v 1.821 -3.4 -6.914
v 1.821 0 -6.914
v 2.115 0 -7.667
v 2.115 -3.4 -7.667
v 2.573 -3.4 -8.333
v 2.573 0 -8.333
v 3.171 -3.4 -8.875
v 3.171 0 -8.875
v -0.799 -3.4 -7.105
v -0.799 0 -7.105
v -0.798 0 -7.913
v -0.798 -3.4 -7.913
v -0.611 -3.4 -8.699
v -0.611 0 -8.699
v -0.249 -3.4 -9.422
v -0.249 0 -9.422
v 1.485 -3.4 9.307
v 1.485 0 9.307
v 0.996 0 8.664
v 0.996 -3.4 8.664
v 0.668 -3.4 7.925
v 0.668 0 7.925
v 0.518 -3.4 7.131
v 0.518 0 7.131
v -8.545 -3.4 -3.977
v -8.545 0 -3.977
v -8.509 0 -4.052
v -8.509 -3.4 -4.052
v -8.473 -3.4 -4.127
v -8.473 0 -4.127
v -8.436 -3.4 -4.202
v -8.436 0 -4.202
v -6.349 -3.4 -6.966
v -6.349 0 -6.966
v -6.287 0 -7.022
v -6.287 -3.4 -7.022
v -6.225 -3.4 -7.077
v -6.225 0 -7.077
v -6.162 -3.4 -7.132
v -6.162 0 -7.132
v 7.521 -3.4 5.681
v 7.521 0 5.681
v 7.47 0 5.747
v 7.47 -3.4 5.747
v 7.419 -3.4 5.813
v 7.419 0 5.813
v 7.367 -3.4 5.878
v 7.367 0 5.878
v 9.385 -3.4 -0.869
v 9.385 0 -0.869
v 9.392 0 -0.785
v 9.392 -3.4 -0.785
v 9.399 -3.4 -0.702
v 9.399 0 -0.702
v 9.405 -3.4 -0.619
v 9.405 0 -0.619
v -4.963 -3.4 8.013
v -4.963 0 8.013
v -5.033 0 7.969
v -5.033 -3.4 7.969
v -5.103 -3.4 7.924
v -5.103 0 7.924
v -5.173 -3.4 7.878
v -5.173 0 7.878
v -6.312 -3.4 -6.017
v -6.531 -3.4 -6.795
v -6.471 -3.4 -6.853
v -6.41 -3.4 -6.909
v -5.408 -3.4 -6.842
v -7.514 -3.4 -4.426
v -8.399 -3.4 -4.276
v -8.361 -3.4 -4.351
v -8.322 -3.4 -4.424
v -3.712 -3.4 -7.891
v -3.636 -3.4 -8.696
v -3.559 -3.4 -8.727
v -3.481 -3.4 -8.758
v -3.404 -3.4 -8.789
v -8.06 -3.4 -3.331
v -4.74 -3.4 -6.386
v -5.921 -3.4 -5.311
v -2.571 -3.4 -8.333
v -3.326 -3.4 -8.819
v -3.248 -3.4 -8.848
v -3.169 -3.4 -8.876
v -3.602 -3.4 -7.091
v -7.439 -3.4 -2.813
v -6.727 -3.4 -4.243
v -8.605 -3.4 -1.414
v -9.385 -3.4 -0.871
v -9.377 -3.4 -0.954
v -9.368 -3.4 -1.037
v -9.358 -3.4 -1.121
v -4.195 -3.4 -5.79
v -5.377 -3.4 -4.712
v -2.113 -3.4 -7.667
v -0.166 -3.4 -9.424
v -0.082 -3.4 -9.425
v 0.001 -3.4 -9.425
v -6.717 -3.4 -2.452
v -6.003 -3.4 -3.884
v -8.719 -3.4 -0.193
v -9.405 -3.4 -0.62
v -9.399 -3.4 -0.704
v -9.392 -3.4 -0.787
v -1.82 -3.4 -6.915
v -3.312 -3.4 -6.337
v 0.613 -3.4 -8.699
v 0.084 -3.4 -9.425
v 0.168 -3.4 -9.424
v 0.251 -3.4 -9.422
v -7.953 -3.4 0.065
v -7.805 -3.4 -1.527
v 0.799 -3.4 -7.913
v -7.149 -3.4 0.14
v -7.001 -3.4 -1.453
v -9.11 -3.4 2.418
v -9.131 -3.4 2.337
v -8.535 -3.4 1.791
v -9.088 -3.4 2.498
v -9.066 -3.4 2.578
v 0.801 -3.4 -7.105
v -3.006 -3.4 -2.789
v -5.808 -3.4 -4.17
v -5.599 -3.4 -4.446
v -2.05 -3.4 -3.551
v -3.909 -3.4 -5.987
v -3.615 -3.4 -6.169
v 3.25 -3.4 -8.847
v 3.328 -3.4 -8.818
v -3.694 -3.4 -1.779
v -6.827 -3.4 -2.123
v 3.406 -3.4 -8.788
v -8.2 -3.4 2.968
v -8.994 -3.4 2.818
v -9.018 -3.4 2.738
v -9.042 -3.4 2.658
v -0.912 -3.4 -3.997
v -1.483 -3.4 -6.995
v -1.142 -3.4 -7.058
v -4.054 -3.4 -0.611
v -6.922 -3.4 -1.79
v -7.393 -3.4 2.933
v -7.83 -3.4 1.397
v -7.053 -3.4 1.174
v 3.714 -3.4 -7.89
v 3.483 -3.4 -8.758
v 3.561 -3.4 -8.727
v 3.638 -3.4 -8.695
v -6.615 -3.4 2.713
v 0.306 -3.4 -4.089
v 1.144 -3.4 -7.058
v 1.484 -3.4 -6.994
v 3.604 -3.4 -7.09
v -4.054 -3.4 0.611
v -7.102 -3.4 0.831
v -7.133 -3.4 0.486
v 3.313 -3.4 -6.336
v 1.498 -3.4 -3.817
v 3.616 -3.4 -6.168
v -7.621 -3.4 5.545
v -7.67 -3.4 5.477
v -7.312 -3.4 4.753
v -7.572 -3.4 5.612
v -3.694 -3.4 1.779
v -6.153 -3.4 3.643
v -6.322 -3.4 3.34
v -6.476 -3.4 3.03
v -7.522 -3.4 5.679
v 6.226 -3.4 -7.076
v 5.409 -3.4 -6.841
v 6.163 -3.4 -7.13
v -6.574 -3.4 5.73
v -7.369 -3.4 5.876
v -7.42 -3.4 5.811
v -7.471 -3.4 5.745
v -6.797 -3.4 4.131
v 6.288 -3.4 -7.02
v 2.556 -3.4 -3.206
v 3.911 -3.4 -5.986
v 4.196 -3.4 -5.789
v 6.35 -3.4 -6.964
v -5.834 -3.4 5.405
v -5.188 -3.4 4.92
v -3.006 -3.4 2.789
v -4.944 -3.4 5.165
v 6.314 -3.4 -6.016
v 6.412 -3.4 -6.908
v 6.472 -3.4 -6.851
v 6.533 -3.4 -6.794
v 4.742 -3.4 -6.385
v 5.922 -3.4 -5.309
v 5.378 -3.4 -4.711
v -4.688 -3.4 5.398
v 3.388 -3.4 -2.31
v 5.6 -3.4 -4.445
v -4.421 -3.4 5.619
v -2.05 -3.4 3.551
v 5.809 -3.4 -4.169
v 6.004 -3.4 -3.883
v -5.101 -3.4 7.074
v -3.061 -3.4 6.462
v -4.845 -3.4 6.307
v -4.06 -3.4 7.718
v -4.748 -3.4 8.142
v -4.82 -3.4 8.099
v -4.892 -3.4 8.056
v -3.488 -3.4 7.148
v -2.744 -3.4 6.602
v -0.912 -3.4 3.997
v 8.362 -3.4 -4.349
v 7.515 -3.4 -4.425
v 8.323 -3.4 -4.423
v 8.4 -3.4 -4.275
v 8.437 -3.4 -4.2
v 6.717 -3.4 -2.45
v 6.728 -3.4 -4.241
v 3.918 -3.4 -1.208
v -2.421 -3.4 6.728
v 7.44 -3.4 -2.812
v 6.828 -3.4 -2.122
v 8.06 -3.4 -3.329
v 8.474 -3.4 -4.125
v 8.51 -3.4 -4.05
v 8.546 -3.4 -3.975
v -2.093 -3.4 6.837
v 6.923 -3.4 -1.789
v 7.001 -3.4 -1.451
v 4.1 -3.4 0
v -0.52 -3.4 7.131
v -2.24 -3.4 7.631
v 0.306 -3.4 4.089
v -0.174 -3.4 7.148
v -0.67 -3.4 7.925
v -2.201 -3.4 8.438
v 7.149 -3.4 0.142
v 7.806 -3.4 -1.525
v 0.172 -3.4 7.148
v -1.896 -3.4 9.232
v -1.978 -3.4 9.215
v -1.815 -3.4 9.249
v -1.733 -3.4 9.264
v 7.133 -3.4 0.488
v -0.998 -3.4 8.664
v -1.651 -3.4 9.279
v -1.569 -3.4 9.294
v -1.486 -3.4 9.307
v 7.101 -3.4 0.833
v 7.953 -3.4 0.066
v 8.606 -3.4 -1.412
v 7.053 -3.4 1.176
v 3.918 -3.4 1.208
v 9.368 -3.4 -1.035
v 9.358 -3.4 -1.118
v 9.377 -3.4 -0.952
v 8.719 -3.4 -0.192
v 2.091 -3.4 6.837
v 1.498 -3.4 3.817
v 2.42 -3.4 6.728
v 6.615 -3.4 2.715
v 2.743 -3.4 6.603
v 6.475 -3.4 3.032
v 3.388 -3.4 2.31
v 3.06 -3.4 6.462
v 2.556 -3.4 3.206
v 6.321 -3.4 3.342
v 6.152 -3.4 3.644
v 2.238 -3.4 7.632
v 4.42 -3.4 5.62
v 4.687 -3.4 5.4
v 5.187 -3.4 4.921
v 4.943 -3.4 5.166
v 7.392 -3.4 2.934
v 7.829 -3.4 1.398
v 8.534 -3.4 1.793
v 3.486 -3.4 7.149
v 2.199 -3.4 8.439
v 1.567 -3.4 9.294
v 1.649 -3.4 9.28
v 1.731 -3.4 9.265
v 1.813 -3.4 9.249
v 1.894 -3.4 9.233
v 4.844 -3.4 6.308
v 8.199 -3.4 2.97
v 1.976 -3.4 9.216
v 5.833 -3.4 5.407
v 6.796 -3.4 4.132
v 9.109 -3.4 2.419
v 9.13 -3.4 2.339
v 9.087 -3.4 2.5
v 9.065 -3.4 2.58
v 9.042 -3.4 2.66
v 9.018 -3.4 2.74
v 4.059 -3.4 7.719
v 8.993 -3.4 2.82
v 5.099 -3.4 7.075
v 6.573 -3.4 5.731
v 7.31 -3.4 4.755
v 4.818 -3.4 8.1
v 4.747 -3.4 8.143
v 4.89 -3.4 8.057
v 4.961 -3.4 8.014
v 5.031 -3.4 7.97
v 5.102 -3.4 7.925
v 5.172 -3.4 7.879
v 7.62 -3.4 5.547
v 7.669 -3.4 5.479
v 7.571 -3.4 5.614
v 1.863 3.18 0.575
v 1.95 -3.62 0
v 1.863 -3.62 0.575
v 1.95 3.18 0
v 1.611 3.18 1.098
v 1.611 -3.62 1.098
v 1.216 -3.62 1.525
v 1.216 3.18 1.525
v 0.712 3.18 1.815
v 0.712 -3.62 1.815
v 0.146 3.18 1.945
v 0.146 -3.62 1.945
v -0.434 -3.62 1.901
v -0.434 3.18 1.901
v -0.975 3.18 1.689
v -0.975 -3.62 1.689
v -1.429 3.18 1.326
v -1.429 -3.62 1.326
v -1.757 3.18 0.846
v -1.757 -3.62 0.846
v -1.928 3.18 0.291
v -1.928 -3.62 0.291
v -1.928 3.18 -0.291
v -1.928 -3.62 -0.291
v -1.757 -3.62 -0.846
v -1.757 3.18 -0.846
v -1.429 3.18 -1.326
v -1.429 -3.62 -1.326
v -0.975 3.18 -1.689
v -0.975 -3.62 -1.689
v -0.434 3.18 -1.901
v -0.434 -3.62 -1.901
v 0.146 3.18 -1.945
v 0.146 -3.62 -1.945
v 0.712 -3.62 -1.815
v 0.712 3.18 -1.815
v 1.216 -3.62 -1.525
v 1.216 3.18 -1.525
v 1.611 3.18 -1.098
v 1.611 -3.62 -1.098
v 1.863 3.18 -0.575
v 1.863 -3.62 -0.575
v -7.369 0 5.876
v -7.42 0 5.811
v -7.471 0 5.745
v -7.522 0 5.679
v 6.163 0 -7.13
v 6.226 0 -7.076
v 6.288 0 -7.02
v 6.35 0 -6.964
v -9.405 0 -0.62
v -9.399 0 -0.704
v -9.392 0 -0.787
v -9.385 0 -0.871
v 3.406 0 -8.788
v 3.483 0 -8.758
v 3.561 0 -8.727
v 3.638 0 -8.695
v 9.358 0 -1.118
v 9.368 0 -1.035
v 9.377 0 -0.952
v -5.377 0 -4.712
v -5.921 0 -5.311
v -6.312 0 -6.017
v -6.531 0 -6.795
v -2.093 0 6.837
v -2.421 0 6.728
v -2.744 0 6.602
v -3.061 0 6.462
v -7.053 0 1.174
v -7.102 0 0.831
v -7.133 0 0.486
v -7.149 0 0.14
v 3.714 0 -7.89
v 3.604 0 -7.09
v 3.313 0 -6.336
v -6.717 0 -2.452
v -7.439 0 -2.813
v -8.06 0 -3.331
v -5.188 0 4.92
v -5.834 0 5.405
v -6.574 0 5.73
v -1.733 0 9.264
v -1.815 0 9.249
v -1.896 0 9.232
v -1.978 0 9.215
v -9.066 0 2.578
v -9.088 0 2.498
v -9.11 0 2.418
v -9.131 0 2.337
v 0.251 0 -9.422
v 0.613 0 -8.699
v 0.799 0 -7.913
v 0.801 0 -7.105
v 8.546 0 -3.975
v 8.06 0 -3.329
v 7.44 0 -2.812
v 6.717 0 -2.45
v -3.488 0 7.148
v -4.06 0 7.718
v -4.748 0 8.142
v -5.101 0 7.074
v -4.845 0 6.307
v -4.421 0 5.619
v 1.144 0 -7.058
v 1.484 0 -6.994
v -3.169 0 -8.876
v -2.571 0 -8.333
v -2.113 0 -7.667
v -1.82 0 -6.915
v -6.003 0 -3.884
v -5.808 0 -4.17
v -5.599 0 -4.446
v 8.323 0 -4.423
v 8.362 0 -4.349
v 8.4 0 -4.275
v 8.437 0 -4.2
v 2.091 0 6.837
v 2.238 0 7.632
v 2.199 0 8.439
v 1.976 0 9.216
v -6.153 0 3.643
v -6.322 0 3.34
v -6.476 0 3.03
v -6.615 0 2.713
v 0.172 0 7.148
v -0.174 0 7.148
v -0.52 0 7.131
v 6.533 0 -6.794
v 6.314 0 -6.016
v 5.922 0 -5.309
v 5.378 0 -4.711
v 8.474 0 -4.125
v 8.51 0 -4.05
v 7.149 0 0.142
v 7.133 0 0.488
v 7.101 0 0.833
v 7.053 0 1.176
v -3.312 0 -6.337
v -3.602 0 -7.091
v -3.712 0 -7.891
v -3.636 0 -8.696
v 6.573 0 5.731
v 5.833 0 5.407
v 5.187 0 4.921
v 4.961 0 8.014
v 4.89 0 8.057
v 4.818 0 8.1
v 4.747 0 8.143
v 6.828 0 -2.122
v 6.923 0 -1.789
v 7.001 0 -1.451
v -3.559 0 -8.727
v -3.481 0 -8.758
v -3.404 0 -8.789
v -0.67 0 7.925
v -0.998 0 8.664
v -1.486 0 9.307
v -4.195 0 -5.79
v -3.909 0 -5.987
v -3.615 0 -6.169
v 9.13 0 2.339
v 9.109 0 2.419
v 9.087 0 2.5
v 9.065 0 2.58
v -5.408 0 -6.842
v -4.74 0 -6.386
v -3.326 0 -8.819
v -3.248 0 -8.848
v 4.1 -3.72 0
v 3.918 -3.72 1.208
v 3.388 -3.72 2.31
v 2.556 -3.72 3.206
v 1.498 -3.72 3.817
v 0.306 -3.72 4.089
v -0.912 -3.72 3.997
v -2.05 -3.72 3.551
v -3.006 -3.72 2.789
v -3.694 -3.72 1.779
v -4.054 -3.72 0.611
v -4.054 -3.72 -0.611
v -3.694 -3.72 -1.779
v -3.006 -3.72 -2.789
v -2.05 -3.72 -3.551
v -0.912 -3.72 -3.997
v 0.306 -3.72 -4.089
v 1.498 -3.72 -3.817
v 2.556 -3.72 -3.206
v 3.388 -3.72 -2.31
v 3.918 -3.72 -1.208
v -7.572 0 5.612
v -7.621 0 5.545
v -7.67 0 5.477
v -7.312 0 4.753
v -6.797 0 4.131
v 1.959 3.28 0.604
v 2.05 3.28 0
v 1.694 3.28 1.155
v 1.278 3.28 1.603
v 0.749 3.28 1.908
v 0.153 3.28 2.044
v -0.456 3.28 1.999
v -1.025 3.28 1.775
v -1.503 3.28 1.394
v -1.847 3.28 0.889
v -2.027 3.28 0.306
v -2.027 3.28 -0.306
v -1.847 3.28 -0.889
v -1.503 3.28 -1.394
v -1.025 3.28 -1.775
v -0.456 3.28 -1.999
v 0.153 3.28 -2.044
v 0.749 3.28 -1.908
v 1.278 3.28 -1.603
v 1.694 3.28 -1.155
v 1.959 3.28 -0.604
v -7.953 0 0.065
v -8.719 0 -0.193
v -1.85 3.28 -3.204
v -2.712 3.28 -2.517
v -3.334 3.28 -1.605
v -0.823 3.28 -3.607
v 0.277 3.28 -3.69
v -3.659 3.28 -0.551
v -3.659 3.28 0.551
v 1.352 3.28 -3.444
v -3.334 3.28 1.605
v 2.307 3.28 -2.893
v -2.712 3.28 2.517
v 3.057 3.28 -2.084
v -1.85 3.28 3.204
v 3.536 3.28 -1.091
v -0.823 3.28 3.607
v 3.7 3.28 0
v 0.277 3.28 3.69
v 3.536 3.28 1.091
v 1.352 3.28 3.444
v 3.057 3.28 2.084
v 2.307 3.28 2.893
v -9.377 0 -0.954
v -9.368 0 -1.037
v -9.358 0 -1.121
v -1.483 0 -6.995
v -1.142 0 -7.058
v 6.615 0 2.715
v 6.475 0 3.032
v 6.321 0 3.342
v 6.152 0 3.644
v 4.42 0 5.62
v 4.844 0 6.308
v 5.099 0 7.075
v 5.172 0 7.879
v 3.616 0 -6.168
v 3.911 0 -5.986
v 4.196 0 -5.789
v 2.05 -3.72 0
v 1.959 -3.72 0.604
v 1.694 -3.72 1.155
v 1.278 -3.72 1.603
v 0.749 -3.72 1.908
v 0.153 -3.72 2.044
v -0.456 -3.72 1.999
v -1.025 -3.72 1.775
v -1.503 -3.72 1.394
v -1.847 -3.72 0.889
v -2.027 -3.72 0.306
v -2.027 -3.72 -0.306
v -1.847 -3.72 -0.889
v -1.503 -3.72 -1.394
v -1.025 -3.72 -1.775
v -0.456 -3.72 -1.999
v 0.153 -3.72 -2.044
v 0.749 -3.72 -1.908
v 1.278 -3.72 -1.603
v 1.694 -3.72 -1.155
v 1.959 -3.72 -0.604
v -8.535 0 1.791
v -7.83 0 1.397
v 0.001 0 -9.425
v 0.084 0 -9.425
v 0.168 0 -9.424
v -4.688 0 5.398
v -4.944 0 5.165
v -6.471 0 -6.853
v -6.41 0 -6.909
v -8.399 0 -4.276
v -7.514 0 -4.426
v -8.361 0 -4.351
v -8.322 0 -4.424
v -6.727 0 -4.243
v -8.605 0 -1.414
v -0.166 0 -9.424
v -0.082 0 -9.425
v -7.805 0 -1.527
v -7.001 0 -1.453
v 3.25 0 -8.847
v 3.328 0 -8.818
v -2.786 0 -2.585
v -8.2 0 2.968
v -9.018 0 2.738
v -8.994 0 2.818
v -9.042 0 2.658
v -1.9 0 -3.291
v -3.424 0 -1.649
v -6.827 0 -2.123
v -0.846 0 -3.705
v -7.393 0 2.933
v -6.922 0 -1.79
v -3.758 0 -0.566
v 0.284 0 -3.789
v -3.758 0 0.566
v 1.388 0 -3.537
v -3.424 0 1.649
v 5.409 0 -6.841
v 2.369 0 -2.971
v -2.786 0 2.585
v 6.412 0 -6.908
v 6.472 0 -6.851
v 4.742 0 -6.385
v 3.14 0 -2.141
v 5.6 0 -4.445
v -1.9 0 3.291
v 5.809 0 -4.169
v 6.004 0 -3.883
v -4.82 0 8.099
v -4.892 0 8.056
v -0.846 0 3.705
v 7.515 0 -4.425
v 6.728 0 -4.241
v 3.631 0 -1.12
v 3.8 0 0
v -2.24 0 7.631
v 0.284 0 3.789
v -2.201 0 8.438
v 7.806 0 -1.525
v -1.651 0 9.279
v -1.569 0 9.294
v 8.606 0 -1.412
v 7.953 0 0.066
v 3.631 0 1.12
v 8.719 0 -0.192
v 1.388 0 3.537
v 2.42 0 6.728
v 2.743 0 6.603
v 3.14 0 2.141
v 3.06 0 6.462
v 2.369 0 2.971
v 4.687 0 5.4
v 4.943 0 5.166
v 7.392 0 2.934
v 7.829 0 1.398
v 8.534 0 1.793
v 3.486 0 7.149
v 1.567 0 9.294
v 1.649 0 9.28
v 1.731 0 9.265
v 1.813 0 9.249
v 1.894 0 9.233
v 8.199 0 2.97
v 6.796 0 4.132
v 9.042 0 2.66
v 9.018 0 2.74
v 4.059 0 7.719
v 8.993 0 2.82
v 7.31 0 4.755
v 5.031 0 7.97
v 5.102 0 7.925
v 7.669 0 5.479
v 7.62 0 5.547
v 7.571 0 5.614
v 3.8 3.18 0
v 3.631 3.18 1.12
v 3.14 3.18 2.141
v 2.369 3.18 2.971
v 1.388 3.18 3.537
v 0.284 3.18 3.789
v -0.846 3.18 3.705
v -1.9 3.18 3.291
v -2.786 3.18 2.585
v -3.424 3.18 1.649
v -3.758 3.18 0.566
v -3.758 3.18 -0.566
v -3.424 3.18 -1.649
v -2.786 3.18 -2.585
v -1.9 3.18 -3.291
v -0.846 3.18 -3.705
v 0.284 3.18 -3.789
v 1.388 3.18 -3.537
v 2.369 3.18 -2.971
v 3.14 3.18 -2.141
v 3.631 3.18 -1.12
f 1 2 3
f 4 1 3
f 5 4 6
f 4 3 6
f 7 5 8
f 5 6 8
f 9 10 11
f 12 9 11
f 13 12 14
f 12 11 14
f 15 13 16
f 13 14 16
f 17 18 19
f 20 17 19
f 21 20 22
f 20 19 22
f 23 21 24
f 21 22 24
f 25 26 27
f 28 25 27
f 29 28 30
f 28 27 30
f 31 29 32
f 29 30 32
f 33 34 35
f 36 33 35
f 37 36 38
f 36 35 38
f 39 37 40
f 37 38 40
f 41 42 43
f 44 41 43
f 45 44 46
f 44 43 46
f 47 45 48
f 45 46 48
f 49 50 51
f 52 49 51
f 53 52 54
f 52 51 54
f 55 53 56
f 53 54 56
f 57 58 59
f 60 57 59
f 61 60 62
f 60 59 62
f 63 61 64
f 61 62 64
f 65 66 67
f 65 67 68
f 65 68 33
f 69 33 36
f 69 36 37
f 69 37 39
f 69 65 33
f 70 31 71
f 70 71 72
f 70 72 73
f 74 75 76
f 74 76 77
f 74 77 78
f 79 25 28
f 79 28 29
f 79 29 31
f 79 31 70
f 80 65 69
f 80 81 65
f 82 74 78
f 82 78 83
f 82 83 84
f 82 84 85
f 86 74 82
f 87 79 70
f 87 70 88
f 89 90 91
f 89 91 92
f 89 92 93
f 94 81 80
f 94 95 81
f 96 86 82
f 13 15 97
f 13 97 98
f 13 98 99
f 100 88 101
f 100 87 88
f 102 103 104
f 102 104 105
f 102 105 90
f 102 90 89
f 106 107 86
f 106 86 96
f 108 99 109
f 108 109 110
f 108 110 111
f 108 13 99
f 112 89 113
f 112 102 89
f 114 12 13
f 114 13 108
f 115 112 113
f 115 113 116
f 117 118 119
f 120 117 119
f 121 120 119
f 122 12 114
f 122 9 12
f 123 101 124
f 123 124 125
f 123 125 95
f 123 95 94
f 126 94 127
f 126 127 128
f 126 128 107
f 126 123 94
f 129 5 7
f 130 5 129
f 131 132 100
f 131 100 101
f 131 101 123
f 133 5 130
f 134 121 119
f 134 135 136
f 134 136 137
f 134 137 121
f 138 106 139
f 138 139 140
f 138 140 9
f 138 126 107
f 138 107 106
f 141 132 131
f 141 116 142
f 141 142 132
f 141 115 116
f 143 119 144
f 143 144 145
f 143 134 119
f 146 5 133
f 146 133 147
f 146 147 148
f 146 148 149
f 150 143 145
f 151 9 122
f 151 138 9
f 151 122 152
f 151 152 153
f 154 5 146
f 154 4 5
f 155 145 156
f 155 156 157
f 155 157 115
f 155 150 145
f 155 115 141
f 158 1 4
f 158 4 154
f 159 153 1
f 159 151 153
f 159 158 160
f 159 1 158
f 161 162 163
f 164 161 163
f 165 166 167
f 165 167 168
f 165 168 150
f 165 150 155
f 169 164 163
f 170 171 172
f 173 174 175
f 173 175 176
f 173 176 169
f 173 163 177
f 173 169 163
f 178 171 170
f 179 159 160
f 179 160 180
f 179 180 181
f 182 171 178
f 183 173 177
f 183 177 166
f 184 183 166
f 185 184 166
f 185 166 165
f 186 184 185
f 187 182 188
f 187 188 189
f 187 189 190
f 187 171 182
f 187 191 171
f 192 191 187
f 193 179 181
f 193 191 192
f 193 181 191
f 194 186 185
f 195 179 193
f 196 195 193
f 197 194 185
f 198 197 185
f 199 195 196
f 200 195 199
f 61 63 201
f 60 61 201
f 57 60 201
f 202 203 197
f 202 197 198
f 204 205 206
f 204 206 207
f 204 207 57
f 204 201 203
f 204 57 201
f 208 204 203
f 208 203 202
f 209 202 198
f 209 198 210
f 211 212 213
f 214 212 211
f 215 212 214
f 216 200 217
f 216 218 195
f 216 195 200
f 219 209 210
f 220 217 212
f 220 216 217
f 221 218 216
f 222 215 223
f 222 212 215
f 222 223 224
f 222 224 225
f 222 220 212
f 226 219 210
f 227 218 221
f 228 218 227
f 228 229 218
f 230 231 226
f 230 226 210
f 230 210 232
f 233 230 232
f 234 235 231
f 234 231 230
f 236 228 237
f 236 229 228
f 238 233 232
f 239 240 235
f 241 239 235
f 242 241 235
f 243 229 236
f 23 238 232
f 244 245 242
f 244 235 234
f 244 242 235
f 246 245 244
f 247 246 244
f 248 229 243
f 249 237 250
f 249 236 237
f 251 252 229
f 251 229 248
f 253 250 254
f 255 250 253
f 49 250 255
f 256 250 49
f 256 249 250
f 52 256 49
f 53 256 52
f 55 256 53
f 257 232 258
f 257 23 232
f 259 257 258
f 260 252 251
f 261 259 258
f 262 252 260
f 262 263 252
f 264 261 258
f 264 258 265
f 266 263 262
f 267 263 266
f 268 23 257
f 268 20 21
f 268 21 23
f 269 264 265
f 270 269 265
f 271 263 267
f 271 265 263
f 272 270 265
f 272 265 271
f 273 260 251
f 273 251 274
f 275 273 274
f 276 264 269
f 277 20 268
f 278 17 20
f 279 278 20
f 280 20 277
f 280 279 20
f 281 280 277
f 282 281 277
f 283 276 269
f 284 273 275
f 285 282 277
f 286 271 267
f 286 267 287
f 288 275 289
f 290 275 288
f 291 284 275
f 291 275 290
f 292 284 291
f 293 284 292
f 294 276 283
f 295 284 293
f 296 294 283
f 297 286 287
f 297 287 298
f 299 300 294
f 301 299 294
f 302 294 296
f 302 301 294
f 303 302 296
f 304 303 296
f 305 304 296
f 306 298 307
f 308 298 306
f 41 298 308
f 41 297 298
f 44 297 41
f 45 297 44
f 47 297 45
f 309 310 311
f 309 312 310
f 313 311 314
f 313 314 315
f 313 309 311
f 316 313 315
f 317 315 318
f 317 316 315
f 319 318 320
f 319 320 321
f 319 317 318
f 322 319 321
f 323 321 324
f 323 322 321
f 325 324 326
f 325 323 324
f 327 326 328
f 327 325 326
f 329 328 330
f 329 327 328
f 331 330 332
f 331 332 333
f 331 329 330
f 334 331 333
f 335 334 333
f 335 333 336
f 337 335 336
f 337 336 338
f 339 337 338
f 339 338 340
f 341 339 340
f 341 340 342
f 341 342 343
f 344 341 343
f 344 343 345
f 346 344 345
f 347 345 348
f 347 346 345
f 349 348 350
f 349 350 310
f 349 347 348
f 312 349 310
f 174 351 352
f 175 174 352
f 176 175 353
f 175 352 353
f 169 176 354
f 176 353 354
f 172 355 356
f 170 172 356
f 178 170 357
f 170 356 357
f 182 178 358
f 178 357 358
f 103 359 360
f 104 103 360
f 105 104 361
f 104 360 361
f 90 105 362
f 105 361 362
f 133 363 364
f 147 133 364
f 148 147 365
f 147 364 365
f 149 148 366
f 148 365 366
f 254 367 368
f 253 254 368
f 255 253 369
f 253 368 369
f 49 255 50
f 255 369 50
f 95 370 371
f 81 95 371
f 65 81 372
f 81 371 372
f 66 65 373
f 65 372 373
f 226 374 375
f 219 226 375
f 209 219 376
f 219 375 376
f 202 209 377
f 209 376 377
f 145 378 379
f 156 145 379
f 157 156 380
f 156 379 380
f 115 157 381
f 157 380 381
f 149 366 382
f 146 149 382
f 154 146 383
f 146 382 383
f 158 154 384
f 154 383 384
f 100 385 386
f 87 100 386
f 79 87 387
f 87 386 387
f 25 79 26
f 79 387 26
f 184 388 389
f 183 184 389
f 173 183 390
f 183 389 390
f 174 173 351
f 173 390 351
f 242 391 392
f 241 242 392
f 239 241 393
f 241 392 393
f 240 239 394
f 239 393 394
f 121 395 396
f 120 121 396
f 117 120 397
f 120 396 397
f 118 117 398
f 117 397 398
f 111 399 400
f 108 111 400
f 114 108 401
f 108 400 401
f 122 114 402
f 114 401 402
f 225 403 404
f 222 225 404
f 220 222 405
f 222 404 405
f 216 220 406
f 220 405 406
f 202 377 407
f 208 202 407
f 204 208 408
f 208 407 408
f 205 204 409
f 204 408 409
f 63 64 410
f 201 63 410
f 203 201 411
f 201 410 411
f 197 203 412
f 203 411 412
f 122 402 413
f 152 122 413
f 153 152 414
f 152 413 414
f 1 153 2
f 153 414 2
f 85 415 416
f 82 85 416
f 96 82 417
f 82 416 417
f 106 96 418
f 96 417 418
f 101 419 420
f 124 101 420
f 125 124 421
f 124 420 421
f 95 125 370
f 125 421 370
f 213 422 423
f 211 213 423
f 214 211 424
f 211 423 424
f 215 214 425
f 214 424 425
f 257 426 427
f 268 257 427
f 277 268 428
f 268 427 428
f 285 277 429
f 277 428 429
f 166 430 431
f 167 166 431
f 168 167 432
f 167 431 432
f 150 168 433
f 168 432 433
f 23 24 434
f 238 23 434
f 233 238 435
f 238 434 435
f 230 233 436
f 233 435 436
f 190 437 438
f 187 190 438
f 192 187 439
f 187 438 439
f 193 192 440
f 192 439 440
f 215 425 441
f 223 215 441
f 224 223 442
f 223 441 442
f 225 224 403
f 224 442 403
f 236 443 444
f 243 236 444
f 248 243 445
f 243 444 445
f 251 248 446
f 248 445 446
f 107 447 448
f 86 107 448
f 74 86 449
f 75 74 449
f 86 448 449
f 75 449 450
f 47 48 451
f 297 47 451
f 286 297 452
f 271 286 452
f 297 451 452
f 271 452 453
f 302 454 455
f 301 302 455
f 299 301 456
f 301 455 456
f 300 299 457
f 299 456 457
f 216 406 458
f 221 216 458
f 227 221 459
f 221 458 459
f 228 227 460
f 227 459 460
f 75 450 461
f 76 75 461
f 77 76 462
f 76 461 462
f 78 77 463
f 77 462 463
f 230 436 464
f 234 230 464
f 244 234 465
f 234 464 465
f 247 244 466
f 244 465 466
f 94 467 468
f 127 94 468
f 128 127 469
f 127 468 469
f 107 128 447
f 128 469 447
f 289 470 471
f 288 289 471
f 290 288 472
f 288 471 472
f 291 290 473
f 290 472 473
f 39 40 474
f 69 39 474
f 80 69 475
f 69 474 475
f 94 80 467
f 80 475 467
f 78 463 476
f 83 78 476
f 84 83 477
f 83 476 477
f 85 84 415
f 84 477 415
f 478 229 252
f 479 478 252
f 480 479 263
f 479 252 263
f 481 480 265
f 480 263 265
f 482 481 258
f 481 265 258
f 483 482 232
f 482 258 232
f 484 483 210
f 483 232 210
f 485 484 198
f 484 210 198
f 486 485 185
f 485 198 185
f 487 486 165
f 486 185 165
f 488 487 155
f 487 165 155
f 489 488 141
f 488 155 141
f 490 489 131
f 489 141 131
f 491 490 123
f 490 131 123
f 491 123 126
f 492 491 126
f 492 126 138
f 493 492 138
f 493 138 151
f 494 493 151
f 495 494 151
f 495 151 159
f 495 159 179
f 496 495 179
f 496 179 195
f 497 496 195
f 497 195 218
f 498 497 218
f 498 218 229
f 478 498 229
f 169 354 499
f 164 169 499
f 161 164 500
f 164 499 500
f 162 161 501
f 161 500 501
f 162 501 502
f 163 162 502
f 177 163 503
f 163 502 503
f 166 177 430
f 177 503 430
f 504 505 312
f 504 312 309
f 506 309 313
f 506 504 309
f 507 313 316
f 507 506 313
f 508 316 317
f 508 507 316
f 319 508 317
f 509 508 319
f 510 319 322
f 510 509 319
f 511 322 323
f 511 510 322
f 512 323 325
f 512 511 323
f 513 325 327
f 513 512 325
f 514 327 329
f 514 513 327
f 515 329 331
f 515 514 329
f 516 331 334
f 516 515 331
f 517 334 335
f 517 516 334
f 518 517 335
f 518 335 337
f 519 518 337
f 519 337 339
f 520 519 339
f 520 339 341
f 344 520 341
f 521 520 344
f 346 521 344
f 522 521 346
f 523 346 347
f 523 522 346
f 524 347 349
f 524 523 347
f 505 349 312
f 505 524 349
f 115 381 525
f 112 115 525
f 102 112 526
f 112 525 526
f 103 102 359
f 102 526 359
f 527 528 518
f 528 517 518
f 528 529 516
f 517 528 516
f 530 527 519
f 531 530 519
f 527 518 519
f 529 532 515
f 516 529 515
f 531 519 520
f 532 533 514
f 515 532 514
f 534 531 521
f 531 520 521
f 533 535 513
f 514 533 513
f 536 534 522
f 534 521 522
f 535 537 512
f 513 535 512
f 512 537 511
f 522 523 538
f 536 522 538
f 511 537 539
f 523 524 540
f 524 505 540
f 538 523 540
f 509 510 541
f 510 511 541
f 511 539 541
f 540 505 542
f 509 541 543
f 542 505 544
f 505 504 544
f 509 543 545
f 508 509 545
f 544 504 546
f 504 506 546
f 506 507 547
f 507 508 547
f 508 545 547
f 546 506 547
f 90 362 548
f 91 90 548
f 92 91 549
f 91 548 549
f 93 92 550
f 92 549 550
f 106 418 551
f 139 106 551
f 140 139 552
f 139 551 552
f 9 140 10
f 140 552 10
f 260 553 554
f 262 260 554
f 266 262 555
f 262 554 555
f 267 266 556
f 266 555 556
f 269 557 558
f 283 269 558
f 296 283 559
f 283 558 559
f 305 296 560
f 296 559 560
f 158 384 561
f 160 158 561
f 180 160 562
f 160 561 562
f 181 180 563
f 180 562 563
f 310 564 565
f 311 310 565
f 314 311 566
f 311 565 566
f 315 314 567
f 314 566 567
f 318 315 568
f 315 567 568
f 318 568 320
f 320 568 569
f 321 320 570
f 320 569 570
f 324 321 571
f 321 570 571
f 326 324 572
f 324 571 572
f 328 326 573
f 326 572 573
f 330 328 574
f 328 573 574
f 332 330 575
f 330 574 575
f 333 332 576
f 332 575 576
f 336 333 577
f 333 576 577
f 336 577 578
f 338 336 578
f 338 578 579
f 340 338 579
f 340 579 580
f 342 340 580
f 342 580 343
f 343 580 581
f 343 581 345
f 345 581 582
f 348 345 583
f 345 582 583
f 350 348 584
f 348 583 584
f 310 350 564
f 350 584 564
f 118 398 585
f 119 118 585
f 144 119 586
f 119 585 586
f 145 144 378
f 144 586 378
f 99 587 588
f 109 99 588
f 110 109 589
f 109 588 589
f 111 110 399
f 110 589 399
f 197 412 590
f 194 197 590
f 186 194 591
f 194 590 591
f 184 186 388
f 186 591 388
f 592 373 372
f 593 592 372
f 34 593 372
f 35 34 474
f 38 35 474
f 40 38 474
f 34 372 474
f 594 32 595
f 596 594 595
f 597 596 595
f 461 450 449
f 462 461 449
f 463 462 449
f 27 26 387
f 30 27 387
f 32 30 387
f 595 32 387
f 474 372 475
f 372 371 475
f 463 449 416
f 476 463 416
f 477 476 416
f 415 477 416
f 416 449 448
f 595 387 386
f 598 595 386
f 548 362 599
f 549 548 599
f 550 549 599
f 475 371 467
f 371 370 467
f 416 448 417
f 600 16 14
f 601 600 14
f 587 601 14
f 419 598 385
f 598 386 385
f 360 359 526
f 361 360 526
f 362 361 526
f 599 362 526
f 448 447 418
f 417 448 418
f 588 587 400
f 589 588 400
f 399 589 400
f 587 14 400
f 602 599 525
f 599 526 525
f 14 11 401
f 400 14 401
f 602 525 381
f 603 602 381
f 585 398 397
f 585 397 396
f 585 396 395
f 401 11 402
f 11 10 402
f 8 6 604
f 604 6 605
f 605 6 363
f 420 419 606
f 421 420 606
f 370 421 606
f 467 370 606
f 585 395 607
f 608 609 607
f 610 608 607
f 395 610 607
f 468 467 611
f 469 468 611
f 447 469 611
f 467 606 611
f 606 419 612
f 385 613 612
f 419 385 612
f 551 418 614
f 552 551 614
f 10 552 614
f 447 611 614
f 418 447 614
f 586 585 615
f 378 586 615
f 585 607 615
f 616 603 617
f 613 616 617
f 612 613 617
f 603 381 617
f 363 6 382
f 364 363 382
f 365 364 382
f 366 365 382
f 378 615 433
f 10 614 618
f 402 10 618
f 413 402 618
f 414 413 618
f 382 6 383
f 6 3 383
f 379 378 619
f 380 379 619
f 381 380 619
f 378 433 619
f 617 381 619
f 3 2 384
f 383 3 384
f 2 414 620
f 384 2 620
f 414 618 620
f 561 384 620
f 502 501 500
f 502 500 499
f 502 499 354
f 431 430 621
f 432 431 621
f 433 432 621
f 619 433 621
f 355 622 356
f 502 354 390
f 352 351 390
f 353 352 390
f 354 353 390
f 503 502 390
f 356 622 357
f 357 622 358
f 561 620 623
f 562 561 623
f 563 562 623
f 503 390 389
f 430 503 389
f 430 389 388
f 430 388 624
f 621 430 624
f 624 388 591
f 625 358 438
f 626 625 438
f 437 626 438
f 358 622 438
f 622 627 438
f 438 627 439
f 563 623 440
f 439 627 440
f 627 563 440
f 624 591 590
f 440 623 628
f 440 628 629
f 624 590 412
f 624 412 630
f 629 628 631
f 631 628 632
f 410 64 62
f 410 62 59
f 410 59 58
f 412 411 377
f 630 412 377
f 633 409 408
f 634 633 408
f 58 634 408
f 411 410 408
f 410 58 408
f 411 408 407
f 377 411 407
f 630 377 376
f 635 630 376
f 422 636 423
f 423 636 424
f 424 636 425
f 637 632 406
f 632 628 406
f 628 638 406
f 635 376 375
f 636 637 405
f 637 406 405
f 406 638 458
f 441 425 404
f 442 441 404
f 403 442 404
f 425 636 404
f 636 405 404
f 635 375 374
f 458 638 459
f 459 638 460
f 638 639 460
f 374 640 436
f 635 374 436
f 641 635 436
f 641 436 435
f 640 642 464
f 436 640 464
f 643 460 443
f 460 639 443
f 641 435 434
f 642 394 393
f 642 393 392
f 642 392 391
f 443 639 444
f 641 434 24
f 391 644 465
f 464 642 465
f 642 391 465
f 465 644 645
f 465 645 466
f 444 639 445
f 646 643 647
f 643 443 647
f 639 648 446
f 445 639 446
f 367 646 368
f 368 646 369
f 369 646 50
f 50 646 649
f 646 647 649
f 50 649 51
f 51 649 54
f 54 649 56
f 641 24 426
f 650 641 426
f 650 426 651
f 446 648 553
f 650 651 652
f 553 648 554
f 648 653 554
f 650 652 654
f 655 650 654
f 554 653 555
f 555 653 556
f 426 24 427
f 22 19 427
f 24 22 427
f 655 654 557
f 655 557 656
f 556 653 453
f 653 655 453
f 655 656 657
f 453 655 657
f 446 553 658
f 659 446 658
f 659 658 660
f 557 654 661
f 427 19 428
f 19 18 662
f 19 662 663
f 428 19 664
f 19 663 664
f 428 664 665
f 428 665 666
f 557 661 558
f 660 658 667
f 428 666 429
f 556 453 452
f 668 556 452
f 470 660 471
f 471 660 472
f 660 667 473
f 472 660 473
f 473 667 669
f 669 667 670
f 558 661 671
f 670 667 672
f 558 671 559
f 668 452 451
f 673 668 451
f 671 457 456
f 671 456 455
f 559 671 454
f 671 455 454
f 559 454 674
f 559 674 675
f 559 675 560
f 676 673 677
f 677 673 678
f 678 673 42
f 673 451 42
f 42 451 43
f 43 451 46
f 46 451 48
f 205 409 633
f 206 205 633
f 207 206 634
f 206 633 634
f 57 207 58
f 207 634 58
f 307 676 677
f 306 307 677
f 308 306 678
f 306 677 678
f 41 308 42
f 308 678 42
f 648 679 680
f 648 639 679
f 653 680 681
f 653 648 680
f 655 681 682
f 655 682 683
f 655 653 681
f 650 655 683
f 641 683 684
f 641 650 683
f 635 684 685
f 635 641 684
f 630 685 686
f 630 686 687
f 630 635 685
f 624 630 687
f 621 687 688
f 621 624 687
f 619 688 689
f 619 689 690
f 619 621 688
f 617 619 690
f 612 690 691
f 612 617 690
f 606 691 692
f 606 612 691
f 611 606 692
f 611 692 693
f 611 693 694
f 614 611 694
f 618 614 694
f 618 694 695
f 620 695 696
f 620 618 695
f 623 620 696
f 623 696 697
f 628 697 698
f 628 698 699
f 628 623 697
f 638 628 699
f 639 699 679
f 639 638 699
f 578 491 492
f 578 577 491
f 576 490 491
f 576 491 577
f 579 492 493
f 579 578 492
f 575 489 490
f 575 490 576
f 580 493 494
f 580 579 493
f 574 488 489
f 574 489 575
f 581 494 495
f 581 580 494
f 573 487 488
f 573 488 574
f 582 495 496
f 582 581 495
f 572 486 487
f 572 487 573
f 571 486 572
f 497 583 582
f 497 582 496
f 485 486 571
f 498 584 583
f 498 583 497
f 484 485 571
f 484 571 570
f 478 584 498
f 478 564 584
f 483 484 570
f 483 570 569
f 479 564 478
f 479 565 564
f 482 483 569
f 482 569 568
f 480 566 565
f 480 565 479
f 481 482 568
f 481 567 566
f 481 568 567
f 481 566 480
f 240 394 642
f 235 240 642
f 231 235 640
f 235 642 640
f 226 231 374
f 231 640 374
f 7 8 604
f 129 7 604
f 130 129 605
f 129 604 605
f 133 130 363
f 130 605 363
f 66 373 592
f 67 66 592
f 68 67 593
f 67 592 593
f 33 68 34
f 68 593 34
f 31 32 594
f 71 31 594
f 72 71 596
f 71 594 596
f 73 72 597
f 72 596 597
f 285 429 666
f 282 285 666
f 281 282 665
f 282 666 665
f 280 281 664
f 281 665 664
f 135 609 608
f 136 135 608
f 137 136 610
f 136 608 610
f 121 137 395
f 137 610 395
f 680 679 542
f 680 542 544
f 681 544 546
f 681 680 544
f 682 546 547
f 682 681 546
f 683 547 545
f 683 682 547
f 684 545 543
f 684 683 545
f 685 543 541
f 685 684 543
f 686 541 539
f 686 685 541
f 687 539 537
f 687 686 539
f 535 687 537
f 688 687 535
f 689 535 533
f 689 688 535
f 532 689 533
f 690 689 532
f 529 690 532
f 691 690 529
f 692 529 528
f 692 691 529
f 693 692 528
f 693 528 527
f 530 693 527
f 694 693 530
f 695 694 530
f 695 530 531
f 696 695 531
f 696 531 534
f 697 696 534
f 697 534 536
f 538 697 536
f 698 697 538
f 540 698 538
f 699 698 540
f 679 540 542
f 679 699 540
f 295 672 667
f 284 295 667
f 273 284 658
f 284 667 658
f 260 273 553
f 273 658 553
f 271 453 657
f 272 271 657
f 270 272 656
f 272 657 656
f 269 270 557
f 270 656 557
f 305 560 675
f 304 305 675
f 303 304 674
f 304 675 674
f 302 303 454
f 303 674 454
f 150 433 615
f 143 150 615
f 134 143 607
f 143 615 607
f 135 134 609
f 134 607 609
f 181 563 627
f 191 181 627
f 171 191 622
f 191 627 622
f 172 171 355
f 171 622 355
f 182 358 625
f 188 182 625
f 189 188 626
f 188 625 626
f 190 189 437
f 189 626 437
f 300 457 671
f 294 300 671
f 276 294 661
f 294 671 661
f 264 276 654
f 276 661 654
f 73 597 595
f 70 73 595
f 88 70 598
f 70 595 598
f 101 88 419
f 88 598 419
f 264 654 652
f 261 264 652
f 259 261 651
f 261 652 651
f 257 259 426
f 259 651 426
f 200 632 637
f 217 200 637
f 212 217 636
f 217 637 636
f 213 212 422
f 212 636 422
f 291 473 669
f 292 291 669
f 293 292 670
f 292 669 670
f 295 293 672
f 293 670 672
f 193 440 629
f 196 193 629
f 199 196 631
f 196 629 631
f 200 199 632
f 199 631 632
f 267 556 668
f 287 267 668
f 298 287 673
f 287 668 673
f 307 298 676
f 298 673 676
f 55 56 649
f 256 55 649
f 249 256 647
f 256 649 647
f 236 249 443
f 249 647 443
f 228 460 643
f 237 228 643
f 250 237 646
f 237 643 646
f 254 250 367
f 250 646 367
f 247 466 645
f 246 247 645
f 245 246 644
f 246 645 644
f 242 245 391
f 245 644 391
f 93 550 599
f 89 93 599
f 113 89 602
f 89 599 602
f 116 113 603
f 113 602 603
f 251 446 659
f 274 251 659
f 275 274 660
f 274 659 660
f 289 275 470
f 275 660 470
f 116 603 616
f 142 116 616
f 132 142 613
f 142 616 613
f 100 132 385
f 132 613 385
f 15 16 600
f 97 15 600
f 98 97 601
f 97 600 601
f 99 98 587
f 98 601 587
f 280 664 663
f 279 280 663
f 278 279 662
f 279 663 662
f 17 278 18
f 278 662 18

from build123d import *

# Parameters (mm, degrees)
F0_R     = 4.1
F1_DEPTH = 3.4
F0_R_2   = 3.8
F0_R_3   = 1.95
F2_DEPTH = 3.72
F3_DEPTH = 3.28
F4_SIZE  = 0.1
F5_SIZE  = 0.1
F6_SIZE  = 0.1
F7_DEPTH = 3.72


# Not quite as in the source:
# - a feature names something its author has since deleted; it is built from what else it names


with BuildPart() as f1:
    # F0 (on Front) → F1 (new body)
    with BuildSketch(Plane.XZ):
        with BuildLine():
            ThreePointArc((-9.1306946704, 2.3368867827), (-8.1937279785, 1.5734002793), (-7.0529357563, 1.1741367966))
            ThreePointArc((-7.0529357563, 1.1741367966), (-7.1195743604, 0.6589088915), (-7.1486252748, 0.1402022865))
            ThreePointArc((-7.1486252748, 0.1402022865), (-8.3432287104, -0.042236429), (-9.4045806012, -0.6200715414))
            ThreePointArc((-9.4045806012, -0.6200715414), (-9.3954740629, -0.7454476061), (-9.384696163, -0.870691063))
            ThreePointArc((-9.384696163, -0.870691063), (-9.3722488189, -0.9957796327), (-9.3581342447, -1.120691063))
            ThreePointArc((-9.3581342447, -1.120691063), (-8.2085925976, -1.4934044314), (-7.0008156513, -1.4529556828))
            ThreePointArc((-7.0008156513, -1.4529556828), (-6.8768331336, -1.9574641892), (-6.7165444751, -2.4516382918))
            ThreePointArc((-6.7165444751, -2.4516382918), (-7.76441436, -3.053950319), (-8.544935067, -3.9767712658))
            ThreePointArc((-8.544935067, -3.9767712658), (-8.4914364249, -4.0897594601), (-8.43644384, -4.2020281216))
            ThreePointArc((-8.43644384, -4.2020281216), (-8.3799669873, -4.3135574983), (-8.3220158032, -4.4243279682))
            ThreePointArc((-8.3220158032, -4.4243279682), (-7.1152349462, -4.3573127689), (-6.0032028311, -3.8838197394))
            ThreePointArc((-6.0032028311, -3.8838197394), (-5.7053436074, -4.3094726268), (-5.3773631048, -4.7123737159))
            ThreePointArc((-5.3773631048, -4.7123737159), (-6.1368874979, -5.6525550384), (-6.5313316874, -6.7950225452))
            ThreePointArc((-6.5313316874, -6.7950225452), (-6.4406375804, -6.8810473446), (-6.3488105376, -6.9658617383))
            ThreePointArc((-6.3488105376, -6.9658617383), (-6.255866712, -7.0494508071), (-6.1618224526, -7.1317998474))
            ThreePointArc((-6.1618224526, -7.1317998474), (-5.0607335264, -6.6333809478), (-4.1948295471, -5.7901558762))
            ThreePointArc((-4.1948295471, -5.7901558762), (-3.7633208909, -6.0794667424), (-3.3119438366, -6.3366811521))
            ThreePointArc((-3.3119438366, -6.3366811521), (-3.6805479914, -7.487745529), (-3.6356508664, -8.6955544836))
            ThreePointArc((-3.6356508664, -8.6955544836), (-3.5200054468, -8.7430078723), (-3.4037408432, -8.7889233284))
            ThreePointArc((-3.4037408432, -8.7889233284), (-3.2868775071, -8.8332927753), (-3.1694359951, -8.8761084081))
            ThreePointArc((-3.1694359951, -8.8761084081), (-2.3227497605, -8.0135884705), (-1.8199250223, -6.9145045313))
            ThreePointArc((-1.8199250223, -6.9145045313), (-1.3130441845, -7.0284005982), (-0.7992311491, -7.1051903261))
            ThreePointArc((-0.7992311491, -7.1051903261), (-0.727143962, -8.311678782), (-0.2489808346, -9.4217107546))
            ThreePointArc((-0.2489808346, -9.4217107546), (-0.123991383, -9.4241843752), (0.0010198831, -9.4249999448))
            ThreePointArc((0.0010198831, -9.4249999448), (0.1260309698, -9.4241573201), (0.2510198831, -9.4216566494))
            ThreePointArc((0.2510198831, -9.4216566494), (0.7289427654, -8.3115212183), (0.8007688415, -7.1050171895))
            ThreePointArc((0.8007688415, -7.1050171895), (1.3145652461, -7.0281162635), (1.8214214224, -6.9141104997))
            ThreePointArc((1.8214214224, -6.9141104997), (2.3244840135, -8.0130855914), (3.1713568956, -8.8754222683))
            ThreePointArc((3.1713568956, -8.8754222683), (3.2887891386, -8.8325812196), (3.4056428696, -8.7881864821))
            ThreePointArc((3.4056428696, -8.7881864821), (3.5218975334, -8.742245865), (3.6375326803, -8.6947674494))
            ThreePointArc((3.6375326803, -8.6947674494), (3.6821684093, -7.4869488064), (3.3133151488, -6.3359642301))
            ThreePointArc((3.3133151488, -6.3359642301), (3.764636526, -6.078652139), (4.1960825592, -5.7892478921))
            ThreePointArc((4.1960825592, -5.7892478921), (5.0621690097, -6.6322855443), (6.1633657783, -7.1304661337))
            ThreePointArc((6.1633657783, -7.1304661337), (6.2573922134, -7.0480967422), (6.3503179465, -6.9644875604))
            ThreePointArc((6.3503179465, -6.9644875604), (6.4421266315, -6.8796532953), (6.5328021188, -6.7936088699))
            ThreePointArc((6.5328021188, -6.7936088699), (6.1381106848, -5.6512267557), (5.3783828347, -4.7112098322))
            ThreePointArc((5.3783828347, -4.7112098322), (5.7062761334, -4.3082377707), (6.00404323, -3.8825204303))
            ThreePointArc((6.00404323, -3.8825204303), (7.1161845365, -4.3557644871), (8.3229834462, -4.4225073832))
            ThreePointArc((8.3229834462, -4.4225073832), (8.3809053661, -4.3117340184), (8.4373530488, -4.2002022011))
            ThreePointArc((8.4373530488, -4.2002022011), (8.492316565, -4.0879315502), (8.5457862464, -3.9749418147))
            ThreePointArc((8.5457862464, -3.9749418147), (7.7650725635, -3.0522802473), (6.7170749034, -2.4501846343))
            ThreePointArc((6.7170749034, -2.4501846343), (6.8772566086, -1.9559758535), (7.0011299372, -1.4514405265))
            ThreePointArc((7.0011299372, -1.4514405265), (8.2090091905, -1.4913388042), (9.3584507476, -1.1180449923))
            ThreePointArc((9.3584507476, -1.1180449923), (9.3724970598, -0.9934404183), (9.3848843789, -0.868659999))
            ThreePointArc((9.3848843789, -0.868659999), (9.3956105125, -0.7437258211), (9.4046735619, -0.618659999))
            ThreePointArc((9.4046735619, -0.618659999), (8.3432765874, -0.0407321266), (7.1485947646, 0.1417493946))
            ThreePointArc((7.1485947646, 0.1417493946), (7.119431592, 0.6604497002), (7.0526814835, 1.1756631713))
            ThreePointArc((7.0526814835, 1.1756631713), (8.19338727, 1.5751735359), (9.1301887056, 2.3388628005))
            ThreePointArc((9.1301887056, 2.3388628005), (9.0983662855, 2.4597471284), (9.0649434237, 2.5801987762))
            ThreePointArc((9.0649434237, 2.5801987762), (9.0299259996, 2.7001965561), (8.9933201729, 2.8197193598))
            ThreePointArc((8.9933201729, 2.8197193598), (7.794773105, 2.9756140317), (6.6146636541, 2.7145395084))
            ThreePointArc((6.6146636541, 2.7145395084), (6.4000942258, 3.1876784501), (6.1517355927, 3.6439880896))
            ThreePointArc((6.1517355927, 3.6439880896), (7.0710932374, 4.4285897362), (7.6687594725, 5.4791197426))
            ThreePointArc((7.6687594725, 5.4791197426), (7.5954176181, 5.5803455276), (7.5207396972, 5.6805897059))
            ThreePointArc((7.5207396972, 5.6805897059), (7.444738846, 5.7798346442), (7.3674284334, 5.8780628849))
            ThreePointArc((7.3674284334, 5.8780628849), (6.1935005716, 5.5904666436), (5.1873914517, 4.9207184361))
            ThreePointArc((5.1873914517, 4.9207184361), (4.8163943669, 5.2843963991), (4.4199691978, 5.6201754679))
            ThreePointArc((4.4199691978, 5.6201754679), (4.9938151748, 6.683904295), (5.1716286044, 7.8793960795))
            ThreePointArc((5.1716286044, 7.8793960795), (5.0666724743, 7.9472923086), (4.9608250949, 8.0137905749))
            ThreePointArc((4.9608250949, 8.0137905749), (4.8541050851, 8.0788791811), (4.7465312174, 8.1425466779))
            ThreePointArc((4.7465312174, 8.1425466779), (3.7557669795, 7.4503007335), (3.0595379066, 6.4623314522))
            ThreePointArc((3.0595379066, 6.4623314522), (2.5822180472, 6.6674320361), (2.0912654051, 6.8373320093))
            ThreePointArc((2.0912654051, 6.8373320093), (2.2421089696, 8.0365222748), (1.9760667465, 9.2155187165))
            ThreePointArc((1.9760667465, 9.2155187165), (1.8536604305, 9.2409181367), (1.7309279903, 9.2646917538))
            ThreePointArc((1.7309279903, 9.2646917538), (1.6078910188, 9.2868353852), (1.4845711627, 9.307345135))
            ThreePointArc((1.4845711627, 9.307345135), (0.8107889051, 8.3039366723), (0.5184795371, 7.1311765488))
            ThreePointArc((0.5184795371, 7.1311765488), (-0.0006988298, 7.1499999658), (-0.5198735073, 7.1310750618))
            ThreePointArc((-0.5198735073, 7.1310750618), (-0.8124228005, 8.3037784061), (-1.4864122256, 9.307051289))
            ThreePointArc((-1.4864122256, 9.307051289), (-1.609717186, 9.2865190239), (-1.7327389902, 9.2643532204))
            ThreePointArc((-1.7327389902, 9.2643532204), (-1.8554559982, 9.2405577775), (-1.9778466235, 9.2151368809))
            ThreePointArc((-1.9778466235, 9.2151368809), (-2.2436700583, 8.0360880591), (-2.0926019054, 6.8369230846))
            ThreePointArc((-2.0926019054, 6.8369230846), (-2.5835911424, 6.6669000899), (-3.0609364181, 6.4616691531))
            ThreePointArc((-3.0609364181, 6.4616691531), (-3.7573792917, 7.4494877329), (-4.7482933229, 8.141519239))
            ThreePointArc((-4.7482933229, 8.141519239), (-4.8558534091, 8.0778284625), (-4.9625593299, 8.0127167613))
            ThreePointArc((-4.9625593299, 8.0127167613), (-5.0683923152, 7.946195589), (-5.1733337487, 7.8782766469))
            ThreePointArc((-5.1733337487, 7.8782766469), (-4.9952615939, 6.6828233728), (-4.4211854174, 5.6192187629))
            ThreePointArc((-4.4211854174, 5.6192187629), (-4.8175379075, 5.2833539073), (-5.1884562761, 4.9195956613))
            ThreePointArc((-5.1884562761, 4.9195956613), (-6.19471032, 5.5891261102), (-7.3687003961, 5.8764682823))
            ThreePointArc((-7.3687003961, 5.8764682823), (-7.4459895483, 5.7782233123), (-7.521968919, 5.6789619282))
            ThreePointArc((-7.521968919, 5.6789619282), (-7.5966251432, 5.5787015903), (-7.6699450885, 5.477459935))
            ThreePointArc((-7.6699450885, 5.477459935), (-7.0720515108, 4.4270593007), (-6.1525240836, 3.6426566406))
            ThreePointArc((-6.1525240836, 3.6426566406), (-6.4007839559, 3.1862932618), (-6.6152509821, 2.7131078939))
            ThreePointArc((-6.6152509821, 2.7131078939), (-7.7954169073, 2.9739270108), (-8.9939302083, 2.817772952))
            ThreePointArc((-8.9939302083, 2.817772952), (-9.0305101669, 2.6982422288), (-9.0655016202, 2.5782368733))
            ThreePointArc((-9.0655016202, 2.5782368733), (-9.0988984129, 2.4577779948), (-9.1306946704, 2.3368867827))
        make_face()
        Circle(F0_R, mode=Mode.SUBTRACT)
    extrude(amount=F1_DEPTH)



with BuildPart() as f2:
    # F0 (on Front) → F2 (new body)
    with BuildSketch(Plane.XZ):
        Circle(F0_R_2)
        Circle(F0_R_3, mode=Mode.SUBTRACT)
    extrude(amount=F2_DEPTH)

    # F0 (on Front) → F3 (join)
    with BuildSketch(Plane.XZ):
        Circle(F0_R_2)
        Circle(F0_R_3, mode=Mode.SUBTRACT)
    extrude(amount=-F3_DEPTH)

    # F4
    f4_edges = [f2.edges().sort_by_distance(p)[0] for p in [
        (-1.95, 3.28, 0),
    ]]
    chamfer(f4_edges, length=F4_SIZE)

    # F5
    f5_edges = [f2.edges().sort_by_distance(p)[0] for p in [
        (-1.95, -3.72, 0),
    ]]
    chamfer(f5_edges, length=F5_SIZE)

    # F6
    f6_edges = [f2.edges().sort_by_distance(p)[0] for p in [
        (-3.8, 3.28, 0),
    ]]
    chamfer(f6_edges, length=F6_SIZE)


with BuildPart() as f1_1:
    add(f1.part)

    add(f2.part)  # F7 merges F2
    # F0 (on Front) → F7 (join)
    with BuildSketch(Plane.XZ):
        Circle(F0_R)
        Circle(F0_R_2, mode=Mode.SUBTRACT)
    extrude(amount=F7_DEPTH)


solid = f1_1.part
